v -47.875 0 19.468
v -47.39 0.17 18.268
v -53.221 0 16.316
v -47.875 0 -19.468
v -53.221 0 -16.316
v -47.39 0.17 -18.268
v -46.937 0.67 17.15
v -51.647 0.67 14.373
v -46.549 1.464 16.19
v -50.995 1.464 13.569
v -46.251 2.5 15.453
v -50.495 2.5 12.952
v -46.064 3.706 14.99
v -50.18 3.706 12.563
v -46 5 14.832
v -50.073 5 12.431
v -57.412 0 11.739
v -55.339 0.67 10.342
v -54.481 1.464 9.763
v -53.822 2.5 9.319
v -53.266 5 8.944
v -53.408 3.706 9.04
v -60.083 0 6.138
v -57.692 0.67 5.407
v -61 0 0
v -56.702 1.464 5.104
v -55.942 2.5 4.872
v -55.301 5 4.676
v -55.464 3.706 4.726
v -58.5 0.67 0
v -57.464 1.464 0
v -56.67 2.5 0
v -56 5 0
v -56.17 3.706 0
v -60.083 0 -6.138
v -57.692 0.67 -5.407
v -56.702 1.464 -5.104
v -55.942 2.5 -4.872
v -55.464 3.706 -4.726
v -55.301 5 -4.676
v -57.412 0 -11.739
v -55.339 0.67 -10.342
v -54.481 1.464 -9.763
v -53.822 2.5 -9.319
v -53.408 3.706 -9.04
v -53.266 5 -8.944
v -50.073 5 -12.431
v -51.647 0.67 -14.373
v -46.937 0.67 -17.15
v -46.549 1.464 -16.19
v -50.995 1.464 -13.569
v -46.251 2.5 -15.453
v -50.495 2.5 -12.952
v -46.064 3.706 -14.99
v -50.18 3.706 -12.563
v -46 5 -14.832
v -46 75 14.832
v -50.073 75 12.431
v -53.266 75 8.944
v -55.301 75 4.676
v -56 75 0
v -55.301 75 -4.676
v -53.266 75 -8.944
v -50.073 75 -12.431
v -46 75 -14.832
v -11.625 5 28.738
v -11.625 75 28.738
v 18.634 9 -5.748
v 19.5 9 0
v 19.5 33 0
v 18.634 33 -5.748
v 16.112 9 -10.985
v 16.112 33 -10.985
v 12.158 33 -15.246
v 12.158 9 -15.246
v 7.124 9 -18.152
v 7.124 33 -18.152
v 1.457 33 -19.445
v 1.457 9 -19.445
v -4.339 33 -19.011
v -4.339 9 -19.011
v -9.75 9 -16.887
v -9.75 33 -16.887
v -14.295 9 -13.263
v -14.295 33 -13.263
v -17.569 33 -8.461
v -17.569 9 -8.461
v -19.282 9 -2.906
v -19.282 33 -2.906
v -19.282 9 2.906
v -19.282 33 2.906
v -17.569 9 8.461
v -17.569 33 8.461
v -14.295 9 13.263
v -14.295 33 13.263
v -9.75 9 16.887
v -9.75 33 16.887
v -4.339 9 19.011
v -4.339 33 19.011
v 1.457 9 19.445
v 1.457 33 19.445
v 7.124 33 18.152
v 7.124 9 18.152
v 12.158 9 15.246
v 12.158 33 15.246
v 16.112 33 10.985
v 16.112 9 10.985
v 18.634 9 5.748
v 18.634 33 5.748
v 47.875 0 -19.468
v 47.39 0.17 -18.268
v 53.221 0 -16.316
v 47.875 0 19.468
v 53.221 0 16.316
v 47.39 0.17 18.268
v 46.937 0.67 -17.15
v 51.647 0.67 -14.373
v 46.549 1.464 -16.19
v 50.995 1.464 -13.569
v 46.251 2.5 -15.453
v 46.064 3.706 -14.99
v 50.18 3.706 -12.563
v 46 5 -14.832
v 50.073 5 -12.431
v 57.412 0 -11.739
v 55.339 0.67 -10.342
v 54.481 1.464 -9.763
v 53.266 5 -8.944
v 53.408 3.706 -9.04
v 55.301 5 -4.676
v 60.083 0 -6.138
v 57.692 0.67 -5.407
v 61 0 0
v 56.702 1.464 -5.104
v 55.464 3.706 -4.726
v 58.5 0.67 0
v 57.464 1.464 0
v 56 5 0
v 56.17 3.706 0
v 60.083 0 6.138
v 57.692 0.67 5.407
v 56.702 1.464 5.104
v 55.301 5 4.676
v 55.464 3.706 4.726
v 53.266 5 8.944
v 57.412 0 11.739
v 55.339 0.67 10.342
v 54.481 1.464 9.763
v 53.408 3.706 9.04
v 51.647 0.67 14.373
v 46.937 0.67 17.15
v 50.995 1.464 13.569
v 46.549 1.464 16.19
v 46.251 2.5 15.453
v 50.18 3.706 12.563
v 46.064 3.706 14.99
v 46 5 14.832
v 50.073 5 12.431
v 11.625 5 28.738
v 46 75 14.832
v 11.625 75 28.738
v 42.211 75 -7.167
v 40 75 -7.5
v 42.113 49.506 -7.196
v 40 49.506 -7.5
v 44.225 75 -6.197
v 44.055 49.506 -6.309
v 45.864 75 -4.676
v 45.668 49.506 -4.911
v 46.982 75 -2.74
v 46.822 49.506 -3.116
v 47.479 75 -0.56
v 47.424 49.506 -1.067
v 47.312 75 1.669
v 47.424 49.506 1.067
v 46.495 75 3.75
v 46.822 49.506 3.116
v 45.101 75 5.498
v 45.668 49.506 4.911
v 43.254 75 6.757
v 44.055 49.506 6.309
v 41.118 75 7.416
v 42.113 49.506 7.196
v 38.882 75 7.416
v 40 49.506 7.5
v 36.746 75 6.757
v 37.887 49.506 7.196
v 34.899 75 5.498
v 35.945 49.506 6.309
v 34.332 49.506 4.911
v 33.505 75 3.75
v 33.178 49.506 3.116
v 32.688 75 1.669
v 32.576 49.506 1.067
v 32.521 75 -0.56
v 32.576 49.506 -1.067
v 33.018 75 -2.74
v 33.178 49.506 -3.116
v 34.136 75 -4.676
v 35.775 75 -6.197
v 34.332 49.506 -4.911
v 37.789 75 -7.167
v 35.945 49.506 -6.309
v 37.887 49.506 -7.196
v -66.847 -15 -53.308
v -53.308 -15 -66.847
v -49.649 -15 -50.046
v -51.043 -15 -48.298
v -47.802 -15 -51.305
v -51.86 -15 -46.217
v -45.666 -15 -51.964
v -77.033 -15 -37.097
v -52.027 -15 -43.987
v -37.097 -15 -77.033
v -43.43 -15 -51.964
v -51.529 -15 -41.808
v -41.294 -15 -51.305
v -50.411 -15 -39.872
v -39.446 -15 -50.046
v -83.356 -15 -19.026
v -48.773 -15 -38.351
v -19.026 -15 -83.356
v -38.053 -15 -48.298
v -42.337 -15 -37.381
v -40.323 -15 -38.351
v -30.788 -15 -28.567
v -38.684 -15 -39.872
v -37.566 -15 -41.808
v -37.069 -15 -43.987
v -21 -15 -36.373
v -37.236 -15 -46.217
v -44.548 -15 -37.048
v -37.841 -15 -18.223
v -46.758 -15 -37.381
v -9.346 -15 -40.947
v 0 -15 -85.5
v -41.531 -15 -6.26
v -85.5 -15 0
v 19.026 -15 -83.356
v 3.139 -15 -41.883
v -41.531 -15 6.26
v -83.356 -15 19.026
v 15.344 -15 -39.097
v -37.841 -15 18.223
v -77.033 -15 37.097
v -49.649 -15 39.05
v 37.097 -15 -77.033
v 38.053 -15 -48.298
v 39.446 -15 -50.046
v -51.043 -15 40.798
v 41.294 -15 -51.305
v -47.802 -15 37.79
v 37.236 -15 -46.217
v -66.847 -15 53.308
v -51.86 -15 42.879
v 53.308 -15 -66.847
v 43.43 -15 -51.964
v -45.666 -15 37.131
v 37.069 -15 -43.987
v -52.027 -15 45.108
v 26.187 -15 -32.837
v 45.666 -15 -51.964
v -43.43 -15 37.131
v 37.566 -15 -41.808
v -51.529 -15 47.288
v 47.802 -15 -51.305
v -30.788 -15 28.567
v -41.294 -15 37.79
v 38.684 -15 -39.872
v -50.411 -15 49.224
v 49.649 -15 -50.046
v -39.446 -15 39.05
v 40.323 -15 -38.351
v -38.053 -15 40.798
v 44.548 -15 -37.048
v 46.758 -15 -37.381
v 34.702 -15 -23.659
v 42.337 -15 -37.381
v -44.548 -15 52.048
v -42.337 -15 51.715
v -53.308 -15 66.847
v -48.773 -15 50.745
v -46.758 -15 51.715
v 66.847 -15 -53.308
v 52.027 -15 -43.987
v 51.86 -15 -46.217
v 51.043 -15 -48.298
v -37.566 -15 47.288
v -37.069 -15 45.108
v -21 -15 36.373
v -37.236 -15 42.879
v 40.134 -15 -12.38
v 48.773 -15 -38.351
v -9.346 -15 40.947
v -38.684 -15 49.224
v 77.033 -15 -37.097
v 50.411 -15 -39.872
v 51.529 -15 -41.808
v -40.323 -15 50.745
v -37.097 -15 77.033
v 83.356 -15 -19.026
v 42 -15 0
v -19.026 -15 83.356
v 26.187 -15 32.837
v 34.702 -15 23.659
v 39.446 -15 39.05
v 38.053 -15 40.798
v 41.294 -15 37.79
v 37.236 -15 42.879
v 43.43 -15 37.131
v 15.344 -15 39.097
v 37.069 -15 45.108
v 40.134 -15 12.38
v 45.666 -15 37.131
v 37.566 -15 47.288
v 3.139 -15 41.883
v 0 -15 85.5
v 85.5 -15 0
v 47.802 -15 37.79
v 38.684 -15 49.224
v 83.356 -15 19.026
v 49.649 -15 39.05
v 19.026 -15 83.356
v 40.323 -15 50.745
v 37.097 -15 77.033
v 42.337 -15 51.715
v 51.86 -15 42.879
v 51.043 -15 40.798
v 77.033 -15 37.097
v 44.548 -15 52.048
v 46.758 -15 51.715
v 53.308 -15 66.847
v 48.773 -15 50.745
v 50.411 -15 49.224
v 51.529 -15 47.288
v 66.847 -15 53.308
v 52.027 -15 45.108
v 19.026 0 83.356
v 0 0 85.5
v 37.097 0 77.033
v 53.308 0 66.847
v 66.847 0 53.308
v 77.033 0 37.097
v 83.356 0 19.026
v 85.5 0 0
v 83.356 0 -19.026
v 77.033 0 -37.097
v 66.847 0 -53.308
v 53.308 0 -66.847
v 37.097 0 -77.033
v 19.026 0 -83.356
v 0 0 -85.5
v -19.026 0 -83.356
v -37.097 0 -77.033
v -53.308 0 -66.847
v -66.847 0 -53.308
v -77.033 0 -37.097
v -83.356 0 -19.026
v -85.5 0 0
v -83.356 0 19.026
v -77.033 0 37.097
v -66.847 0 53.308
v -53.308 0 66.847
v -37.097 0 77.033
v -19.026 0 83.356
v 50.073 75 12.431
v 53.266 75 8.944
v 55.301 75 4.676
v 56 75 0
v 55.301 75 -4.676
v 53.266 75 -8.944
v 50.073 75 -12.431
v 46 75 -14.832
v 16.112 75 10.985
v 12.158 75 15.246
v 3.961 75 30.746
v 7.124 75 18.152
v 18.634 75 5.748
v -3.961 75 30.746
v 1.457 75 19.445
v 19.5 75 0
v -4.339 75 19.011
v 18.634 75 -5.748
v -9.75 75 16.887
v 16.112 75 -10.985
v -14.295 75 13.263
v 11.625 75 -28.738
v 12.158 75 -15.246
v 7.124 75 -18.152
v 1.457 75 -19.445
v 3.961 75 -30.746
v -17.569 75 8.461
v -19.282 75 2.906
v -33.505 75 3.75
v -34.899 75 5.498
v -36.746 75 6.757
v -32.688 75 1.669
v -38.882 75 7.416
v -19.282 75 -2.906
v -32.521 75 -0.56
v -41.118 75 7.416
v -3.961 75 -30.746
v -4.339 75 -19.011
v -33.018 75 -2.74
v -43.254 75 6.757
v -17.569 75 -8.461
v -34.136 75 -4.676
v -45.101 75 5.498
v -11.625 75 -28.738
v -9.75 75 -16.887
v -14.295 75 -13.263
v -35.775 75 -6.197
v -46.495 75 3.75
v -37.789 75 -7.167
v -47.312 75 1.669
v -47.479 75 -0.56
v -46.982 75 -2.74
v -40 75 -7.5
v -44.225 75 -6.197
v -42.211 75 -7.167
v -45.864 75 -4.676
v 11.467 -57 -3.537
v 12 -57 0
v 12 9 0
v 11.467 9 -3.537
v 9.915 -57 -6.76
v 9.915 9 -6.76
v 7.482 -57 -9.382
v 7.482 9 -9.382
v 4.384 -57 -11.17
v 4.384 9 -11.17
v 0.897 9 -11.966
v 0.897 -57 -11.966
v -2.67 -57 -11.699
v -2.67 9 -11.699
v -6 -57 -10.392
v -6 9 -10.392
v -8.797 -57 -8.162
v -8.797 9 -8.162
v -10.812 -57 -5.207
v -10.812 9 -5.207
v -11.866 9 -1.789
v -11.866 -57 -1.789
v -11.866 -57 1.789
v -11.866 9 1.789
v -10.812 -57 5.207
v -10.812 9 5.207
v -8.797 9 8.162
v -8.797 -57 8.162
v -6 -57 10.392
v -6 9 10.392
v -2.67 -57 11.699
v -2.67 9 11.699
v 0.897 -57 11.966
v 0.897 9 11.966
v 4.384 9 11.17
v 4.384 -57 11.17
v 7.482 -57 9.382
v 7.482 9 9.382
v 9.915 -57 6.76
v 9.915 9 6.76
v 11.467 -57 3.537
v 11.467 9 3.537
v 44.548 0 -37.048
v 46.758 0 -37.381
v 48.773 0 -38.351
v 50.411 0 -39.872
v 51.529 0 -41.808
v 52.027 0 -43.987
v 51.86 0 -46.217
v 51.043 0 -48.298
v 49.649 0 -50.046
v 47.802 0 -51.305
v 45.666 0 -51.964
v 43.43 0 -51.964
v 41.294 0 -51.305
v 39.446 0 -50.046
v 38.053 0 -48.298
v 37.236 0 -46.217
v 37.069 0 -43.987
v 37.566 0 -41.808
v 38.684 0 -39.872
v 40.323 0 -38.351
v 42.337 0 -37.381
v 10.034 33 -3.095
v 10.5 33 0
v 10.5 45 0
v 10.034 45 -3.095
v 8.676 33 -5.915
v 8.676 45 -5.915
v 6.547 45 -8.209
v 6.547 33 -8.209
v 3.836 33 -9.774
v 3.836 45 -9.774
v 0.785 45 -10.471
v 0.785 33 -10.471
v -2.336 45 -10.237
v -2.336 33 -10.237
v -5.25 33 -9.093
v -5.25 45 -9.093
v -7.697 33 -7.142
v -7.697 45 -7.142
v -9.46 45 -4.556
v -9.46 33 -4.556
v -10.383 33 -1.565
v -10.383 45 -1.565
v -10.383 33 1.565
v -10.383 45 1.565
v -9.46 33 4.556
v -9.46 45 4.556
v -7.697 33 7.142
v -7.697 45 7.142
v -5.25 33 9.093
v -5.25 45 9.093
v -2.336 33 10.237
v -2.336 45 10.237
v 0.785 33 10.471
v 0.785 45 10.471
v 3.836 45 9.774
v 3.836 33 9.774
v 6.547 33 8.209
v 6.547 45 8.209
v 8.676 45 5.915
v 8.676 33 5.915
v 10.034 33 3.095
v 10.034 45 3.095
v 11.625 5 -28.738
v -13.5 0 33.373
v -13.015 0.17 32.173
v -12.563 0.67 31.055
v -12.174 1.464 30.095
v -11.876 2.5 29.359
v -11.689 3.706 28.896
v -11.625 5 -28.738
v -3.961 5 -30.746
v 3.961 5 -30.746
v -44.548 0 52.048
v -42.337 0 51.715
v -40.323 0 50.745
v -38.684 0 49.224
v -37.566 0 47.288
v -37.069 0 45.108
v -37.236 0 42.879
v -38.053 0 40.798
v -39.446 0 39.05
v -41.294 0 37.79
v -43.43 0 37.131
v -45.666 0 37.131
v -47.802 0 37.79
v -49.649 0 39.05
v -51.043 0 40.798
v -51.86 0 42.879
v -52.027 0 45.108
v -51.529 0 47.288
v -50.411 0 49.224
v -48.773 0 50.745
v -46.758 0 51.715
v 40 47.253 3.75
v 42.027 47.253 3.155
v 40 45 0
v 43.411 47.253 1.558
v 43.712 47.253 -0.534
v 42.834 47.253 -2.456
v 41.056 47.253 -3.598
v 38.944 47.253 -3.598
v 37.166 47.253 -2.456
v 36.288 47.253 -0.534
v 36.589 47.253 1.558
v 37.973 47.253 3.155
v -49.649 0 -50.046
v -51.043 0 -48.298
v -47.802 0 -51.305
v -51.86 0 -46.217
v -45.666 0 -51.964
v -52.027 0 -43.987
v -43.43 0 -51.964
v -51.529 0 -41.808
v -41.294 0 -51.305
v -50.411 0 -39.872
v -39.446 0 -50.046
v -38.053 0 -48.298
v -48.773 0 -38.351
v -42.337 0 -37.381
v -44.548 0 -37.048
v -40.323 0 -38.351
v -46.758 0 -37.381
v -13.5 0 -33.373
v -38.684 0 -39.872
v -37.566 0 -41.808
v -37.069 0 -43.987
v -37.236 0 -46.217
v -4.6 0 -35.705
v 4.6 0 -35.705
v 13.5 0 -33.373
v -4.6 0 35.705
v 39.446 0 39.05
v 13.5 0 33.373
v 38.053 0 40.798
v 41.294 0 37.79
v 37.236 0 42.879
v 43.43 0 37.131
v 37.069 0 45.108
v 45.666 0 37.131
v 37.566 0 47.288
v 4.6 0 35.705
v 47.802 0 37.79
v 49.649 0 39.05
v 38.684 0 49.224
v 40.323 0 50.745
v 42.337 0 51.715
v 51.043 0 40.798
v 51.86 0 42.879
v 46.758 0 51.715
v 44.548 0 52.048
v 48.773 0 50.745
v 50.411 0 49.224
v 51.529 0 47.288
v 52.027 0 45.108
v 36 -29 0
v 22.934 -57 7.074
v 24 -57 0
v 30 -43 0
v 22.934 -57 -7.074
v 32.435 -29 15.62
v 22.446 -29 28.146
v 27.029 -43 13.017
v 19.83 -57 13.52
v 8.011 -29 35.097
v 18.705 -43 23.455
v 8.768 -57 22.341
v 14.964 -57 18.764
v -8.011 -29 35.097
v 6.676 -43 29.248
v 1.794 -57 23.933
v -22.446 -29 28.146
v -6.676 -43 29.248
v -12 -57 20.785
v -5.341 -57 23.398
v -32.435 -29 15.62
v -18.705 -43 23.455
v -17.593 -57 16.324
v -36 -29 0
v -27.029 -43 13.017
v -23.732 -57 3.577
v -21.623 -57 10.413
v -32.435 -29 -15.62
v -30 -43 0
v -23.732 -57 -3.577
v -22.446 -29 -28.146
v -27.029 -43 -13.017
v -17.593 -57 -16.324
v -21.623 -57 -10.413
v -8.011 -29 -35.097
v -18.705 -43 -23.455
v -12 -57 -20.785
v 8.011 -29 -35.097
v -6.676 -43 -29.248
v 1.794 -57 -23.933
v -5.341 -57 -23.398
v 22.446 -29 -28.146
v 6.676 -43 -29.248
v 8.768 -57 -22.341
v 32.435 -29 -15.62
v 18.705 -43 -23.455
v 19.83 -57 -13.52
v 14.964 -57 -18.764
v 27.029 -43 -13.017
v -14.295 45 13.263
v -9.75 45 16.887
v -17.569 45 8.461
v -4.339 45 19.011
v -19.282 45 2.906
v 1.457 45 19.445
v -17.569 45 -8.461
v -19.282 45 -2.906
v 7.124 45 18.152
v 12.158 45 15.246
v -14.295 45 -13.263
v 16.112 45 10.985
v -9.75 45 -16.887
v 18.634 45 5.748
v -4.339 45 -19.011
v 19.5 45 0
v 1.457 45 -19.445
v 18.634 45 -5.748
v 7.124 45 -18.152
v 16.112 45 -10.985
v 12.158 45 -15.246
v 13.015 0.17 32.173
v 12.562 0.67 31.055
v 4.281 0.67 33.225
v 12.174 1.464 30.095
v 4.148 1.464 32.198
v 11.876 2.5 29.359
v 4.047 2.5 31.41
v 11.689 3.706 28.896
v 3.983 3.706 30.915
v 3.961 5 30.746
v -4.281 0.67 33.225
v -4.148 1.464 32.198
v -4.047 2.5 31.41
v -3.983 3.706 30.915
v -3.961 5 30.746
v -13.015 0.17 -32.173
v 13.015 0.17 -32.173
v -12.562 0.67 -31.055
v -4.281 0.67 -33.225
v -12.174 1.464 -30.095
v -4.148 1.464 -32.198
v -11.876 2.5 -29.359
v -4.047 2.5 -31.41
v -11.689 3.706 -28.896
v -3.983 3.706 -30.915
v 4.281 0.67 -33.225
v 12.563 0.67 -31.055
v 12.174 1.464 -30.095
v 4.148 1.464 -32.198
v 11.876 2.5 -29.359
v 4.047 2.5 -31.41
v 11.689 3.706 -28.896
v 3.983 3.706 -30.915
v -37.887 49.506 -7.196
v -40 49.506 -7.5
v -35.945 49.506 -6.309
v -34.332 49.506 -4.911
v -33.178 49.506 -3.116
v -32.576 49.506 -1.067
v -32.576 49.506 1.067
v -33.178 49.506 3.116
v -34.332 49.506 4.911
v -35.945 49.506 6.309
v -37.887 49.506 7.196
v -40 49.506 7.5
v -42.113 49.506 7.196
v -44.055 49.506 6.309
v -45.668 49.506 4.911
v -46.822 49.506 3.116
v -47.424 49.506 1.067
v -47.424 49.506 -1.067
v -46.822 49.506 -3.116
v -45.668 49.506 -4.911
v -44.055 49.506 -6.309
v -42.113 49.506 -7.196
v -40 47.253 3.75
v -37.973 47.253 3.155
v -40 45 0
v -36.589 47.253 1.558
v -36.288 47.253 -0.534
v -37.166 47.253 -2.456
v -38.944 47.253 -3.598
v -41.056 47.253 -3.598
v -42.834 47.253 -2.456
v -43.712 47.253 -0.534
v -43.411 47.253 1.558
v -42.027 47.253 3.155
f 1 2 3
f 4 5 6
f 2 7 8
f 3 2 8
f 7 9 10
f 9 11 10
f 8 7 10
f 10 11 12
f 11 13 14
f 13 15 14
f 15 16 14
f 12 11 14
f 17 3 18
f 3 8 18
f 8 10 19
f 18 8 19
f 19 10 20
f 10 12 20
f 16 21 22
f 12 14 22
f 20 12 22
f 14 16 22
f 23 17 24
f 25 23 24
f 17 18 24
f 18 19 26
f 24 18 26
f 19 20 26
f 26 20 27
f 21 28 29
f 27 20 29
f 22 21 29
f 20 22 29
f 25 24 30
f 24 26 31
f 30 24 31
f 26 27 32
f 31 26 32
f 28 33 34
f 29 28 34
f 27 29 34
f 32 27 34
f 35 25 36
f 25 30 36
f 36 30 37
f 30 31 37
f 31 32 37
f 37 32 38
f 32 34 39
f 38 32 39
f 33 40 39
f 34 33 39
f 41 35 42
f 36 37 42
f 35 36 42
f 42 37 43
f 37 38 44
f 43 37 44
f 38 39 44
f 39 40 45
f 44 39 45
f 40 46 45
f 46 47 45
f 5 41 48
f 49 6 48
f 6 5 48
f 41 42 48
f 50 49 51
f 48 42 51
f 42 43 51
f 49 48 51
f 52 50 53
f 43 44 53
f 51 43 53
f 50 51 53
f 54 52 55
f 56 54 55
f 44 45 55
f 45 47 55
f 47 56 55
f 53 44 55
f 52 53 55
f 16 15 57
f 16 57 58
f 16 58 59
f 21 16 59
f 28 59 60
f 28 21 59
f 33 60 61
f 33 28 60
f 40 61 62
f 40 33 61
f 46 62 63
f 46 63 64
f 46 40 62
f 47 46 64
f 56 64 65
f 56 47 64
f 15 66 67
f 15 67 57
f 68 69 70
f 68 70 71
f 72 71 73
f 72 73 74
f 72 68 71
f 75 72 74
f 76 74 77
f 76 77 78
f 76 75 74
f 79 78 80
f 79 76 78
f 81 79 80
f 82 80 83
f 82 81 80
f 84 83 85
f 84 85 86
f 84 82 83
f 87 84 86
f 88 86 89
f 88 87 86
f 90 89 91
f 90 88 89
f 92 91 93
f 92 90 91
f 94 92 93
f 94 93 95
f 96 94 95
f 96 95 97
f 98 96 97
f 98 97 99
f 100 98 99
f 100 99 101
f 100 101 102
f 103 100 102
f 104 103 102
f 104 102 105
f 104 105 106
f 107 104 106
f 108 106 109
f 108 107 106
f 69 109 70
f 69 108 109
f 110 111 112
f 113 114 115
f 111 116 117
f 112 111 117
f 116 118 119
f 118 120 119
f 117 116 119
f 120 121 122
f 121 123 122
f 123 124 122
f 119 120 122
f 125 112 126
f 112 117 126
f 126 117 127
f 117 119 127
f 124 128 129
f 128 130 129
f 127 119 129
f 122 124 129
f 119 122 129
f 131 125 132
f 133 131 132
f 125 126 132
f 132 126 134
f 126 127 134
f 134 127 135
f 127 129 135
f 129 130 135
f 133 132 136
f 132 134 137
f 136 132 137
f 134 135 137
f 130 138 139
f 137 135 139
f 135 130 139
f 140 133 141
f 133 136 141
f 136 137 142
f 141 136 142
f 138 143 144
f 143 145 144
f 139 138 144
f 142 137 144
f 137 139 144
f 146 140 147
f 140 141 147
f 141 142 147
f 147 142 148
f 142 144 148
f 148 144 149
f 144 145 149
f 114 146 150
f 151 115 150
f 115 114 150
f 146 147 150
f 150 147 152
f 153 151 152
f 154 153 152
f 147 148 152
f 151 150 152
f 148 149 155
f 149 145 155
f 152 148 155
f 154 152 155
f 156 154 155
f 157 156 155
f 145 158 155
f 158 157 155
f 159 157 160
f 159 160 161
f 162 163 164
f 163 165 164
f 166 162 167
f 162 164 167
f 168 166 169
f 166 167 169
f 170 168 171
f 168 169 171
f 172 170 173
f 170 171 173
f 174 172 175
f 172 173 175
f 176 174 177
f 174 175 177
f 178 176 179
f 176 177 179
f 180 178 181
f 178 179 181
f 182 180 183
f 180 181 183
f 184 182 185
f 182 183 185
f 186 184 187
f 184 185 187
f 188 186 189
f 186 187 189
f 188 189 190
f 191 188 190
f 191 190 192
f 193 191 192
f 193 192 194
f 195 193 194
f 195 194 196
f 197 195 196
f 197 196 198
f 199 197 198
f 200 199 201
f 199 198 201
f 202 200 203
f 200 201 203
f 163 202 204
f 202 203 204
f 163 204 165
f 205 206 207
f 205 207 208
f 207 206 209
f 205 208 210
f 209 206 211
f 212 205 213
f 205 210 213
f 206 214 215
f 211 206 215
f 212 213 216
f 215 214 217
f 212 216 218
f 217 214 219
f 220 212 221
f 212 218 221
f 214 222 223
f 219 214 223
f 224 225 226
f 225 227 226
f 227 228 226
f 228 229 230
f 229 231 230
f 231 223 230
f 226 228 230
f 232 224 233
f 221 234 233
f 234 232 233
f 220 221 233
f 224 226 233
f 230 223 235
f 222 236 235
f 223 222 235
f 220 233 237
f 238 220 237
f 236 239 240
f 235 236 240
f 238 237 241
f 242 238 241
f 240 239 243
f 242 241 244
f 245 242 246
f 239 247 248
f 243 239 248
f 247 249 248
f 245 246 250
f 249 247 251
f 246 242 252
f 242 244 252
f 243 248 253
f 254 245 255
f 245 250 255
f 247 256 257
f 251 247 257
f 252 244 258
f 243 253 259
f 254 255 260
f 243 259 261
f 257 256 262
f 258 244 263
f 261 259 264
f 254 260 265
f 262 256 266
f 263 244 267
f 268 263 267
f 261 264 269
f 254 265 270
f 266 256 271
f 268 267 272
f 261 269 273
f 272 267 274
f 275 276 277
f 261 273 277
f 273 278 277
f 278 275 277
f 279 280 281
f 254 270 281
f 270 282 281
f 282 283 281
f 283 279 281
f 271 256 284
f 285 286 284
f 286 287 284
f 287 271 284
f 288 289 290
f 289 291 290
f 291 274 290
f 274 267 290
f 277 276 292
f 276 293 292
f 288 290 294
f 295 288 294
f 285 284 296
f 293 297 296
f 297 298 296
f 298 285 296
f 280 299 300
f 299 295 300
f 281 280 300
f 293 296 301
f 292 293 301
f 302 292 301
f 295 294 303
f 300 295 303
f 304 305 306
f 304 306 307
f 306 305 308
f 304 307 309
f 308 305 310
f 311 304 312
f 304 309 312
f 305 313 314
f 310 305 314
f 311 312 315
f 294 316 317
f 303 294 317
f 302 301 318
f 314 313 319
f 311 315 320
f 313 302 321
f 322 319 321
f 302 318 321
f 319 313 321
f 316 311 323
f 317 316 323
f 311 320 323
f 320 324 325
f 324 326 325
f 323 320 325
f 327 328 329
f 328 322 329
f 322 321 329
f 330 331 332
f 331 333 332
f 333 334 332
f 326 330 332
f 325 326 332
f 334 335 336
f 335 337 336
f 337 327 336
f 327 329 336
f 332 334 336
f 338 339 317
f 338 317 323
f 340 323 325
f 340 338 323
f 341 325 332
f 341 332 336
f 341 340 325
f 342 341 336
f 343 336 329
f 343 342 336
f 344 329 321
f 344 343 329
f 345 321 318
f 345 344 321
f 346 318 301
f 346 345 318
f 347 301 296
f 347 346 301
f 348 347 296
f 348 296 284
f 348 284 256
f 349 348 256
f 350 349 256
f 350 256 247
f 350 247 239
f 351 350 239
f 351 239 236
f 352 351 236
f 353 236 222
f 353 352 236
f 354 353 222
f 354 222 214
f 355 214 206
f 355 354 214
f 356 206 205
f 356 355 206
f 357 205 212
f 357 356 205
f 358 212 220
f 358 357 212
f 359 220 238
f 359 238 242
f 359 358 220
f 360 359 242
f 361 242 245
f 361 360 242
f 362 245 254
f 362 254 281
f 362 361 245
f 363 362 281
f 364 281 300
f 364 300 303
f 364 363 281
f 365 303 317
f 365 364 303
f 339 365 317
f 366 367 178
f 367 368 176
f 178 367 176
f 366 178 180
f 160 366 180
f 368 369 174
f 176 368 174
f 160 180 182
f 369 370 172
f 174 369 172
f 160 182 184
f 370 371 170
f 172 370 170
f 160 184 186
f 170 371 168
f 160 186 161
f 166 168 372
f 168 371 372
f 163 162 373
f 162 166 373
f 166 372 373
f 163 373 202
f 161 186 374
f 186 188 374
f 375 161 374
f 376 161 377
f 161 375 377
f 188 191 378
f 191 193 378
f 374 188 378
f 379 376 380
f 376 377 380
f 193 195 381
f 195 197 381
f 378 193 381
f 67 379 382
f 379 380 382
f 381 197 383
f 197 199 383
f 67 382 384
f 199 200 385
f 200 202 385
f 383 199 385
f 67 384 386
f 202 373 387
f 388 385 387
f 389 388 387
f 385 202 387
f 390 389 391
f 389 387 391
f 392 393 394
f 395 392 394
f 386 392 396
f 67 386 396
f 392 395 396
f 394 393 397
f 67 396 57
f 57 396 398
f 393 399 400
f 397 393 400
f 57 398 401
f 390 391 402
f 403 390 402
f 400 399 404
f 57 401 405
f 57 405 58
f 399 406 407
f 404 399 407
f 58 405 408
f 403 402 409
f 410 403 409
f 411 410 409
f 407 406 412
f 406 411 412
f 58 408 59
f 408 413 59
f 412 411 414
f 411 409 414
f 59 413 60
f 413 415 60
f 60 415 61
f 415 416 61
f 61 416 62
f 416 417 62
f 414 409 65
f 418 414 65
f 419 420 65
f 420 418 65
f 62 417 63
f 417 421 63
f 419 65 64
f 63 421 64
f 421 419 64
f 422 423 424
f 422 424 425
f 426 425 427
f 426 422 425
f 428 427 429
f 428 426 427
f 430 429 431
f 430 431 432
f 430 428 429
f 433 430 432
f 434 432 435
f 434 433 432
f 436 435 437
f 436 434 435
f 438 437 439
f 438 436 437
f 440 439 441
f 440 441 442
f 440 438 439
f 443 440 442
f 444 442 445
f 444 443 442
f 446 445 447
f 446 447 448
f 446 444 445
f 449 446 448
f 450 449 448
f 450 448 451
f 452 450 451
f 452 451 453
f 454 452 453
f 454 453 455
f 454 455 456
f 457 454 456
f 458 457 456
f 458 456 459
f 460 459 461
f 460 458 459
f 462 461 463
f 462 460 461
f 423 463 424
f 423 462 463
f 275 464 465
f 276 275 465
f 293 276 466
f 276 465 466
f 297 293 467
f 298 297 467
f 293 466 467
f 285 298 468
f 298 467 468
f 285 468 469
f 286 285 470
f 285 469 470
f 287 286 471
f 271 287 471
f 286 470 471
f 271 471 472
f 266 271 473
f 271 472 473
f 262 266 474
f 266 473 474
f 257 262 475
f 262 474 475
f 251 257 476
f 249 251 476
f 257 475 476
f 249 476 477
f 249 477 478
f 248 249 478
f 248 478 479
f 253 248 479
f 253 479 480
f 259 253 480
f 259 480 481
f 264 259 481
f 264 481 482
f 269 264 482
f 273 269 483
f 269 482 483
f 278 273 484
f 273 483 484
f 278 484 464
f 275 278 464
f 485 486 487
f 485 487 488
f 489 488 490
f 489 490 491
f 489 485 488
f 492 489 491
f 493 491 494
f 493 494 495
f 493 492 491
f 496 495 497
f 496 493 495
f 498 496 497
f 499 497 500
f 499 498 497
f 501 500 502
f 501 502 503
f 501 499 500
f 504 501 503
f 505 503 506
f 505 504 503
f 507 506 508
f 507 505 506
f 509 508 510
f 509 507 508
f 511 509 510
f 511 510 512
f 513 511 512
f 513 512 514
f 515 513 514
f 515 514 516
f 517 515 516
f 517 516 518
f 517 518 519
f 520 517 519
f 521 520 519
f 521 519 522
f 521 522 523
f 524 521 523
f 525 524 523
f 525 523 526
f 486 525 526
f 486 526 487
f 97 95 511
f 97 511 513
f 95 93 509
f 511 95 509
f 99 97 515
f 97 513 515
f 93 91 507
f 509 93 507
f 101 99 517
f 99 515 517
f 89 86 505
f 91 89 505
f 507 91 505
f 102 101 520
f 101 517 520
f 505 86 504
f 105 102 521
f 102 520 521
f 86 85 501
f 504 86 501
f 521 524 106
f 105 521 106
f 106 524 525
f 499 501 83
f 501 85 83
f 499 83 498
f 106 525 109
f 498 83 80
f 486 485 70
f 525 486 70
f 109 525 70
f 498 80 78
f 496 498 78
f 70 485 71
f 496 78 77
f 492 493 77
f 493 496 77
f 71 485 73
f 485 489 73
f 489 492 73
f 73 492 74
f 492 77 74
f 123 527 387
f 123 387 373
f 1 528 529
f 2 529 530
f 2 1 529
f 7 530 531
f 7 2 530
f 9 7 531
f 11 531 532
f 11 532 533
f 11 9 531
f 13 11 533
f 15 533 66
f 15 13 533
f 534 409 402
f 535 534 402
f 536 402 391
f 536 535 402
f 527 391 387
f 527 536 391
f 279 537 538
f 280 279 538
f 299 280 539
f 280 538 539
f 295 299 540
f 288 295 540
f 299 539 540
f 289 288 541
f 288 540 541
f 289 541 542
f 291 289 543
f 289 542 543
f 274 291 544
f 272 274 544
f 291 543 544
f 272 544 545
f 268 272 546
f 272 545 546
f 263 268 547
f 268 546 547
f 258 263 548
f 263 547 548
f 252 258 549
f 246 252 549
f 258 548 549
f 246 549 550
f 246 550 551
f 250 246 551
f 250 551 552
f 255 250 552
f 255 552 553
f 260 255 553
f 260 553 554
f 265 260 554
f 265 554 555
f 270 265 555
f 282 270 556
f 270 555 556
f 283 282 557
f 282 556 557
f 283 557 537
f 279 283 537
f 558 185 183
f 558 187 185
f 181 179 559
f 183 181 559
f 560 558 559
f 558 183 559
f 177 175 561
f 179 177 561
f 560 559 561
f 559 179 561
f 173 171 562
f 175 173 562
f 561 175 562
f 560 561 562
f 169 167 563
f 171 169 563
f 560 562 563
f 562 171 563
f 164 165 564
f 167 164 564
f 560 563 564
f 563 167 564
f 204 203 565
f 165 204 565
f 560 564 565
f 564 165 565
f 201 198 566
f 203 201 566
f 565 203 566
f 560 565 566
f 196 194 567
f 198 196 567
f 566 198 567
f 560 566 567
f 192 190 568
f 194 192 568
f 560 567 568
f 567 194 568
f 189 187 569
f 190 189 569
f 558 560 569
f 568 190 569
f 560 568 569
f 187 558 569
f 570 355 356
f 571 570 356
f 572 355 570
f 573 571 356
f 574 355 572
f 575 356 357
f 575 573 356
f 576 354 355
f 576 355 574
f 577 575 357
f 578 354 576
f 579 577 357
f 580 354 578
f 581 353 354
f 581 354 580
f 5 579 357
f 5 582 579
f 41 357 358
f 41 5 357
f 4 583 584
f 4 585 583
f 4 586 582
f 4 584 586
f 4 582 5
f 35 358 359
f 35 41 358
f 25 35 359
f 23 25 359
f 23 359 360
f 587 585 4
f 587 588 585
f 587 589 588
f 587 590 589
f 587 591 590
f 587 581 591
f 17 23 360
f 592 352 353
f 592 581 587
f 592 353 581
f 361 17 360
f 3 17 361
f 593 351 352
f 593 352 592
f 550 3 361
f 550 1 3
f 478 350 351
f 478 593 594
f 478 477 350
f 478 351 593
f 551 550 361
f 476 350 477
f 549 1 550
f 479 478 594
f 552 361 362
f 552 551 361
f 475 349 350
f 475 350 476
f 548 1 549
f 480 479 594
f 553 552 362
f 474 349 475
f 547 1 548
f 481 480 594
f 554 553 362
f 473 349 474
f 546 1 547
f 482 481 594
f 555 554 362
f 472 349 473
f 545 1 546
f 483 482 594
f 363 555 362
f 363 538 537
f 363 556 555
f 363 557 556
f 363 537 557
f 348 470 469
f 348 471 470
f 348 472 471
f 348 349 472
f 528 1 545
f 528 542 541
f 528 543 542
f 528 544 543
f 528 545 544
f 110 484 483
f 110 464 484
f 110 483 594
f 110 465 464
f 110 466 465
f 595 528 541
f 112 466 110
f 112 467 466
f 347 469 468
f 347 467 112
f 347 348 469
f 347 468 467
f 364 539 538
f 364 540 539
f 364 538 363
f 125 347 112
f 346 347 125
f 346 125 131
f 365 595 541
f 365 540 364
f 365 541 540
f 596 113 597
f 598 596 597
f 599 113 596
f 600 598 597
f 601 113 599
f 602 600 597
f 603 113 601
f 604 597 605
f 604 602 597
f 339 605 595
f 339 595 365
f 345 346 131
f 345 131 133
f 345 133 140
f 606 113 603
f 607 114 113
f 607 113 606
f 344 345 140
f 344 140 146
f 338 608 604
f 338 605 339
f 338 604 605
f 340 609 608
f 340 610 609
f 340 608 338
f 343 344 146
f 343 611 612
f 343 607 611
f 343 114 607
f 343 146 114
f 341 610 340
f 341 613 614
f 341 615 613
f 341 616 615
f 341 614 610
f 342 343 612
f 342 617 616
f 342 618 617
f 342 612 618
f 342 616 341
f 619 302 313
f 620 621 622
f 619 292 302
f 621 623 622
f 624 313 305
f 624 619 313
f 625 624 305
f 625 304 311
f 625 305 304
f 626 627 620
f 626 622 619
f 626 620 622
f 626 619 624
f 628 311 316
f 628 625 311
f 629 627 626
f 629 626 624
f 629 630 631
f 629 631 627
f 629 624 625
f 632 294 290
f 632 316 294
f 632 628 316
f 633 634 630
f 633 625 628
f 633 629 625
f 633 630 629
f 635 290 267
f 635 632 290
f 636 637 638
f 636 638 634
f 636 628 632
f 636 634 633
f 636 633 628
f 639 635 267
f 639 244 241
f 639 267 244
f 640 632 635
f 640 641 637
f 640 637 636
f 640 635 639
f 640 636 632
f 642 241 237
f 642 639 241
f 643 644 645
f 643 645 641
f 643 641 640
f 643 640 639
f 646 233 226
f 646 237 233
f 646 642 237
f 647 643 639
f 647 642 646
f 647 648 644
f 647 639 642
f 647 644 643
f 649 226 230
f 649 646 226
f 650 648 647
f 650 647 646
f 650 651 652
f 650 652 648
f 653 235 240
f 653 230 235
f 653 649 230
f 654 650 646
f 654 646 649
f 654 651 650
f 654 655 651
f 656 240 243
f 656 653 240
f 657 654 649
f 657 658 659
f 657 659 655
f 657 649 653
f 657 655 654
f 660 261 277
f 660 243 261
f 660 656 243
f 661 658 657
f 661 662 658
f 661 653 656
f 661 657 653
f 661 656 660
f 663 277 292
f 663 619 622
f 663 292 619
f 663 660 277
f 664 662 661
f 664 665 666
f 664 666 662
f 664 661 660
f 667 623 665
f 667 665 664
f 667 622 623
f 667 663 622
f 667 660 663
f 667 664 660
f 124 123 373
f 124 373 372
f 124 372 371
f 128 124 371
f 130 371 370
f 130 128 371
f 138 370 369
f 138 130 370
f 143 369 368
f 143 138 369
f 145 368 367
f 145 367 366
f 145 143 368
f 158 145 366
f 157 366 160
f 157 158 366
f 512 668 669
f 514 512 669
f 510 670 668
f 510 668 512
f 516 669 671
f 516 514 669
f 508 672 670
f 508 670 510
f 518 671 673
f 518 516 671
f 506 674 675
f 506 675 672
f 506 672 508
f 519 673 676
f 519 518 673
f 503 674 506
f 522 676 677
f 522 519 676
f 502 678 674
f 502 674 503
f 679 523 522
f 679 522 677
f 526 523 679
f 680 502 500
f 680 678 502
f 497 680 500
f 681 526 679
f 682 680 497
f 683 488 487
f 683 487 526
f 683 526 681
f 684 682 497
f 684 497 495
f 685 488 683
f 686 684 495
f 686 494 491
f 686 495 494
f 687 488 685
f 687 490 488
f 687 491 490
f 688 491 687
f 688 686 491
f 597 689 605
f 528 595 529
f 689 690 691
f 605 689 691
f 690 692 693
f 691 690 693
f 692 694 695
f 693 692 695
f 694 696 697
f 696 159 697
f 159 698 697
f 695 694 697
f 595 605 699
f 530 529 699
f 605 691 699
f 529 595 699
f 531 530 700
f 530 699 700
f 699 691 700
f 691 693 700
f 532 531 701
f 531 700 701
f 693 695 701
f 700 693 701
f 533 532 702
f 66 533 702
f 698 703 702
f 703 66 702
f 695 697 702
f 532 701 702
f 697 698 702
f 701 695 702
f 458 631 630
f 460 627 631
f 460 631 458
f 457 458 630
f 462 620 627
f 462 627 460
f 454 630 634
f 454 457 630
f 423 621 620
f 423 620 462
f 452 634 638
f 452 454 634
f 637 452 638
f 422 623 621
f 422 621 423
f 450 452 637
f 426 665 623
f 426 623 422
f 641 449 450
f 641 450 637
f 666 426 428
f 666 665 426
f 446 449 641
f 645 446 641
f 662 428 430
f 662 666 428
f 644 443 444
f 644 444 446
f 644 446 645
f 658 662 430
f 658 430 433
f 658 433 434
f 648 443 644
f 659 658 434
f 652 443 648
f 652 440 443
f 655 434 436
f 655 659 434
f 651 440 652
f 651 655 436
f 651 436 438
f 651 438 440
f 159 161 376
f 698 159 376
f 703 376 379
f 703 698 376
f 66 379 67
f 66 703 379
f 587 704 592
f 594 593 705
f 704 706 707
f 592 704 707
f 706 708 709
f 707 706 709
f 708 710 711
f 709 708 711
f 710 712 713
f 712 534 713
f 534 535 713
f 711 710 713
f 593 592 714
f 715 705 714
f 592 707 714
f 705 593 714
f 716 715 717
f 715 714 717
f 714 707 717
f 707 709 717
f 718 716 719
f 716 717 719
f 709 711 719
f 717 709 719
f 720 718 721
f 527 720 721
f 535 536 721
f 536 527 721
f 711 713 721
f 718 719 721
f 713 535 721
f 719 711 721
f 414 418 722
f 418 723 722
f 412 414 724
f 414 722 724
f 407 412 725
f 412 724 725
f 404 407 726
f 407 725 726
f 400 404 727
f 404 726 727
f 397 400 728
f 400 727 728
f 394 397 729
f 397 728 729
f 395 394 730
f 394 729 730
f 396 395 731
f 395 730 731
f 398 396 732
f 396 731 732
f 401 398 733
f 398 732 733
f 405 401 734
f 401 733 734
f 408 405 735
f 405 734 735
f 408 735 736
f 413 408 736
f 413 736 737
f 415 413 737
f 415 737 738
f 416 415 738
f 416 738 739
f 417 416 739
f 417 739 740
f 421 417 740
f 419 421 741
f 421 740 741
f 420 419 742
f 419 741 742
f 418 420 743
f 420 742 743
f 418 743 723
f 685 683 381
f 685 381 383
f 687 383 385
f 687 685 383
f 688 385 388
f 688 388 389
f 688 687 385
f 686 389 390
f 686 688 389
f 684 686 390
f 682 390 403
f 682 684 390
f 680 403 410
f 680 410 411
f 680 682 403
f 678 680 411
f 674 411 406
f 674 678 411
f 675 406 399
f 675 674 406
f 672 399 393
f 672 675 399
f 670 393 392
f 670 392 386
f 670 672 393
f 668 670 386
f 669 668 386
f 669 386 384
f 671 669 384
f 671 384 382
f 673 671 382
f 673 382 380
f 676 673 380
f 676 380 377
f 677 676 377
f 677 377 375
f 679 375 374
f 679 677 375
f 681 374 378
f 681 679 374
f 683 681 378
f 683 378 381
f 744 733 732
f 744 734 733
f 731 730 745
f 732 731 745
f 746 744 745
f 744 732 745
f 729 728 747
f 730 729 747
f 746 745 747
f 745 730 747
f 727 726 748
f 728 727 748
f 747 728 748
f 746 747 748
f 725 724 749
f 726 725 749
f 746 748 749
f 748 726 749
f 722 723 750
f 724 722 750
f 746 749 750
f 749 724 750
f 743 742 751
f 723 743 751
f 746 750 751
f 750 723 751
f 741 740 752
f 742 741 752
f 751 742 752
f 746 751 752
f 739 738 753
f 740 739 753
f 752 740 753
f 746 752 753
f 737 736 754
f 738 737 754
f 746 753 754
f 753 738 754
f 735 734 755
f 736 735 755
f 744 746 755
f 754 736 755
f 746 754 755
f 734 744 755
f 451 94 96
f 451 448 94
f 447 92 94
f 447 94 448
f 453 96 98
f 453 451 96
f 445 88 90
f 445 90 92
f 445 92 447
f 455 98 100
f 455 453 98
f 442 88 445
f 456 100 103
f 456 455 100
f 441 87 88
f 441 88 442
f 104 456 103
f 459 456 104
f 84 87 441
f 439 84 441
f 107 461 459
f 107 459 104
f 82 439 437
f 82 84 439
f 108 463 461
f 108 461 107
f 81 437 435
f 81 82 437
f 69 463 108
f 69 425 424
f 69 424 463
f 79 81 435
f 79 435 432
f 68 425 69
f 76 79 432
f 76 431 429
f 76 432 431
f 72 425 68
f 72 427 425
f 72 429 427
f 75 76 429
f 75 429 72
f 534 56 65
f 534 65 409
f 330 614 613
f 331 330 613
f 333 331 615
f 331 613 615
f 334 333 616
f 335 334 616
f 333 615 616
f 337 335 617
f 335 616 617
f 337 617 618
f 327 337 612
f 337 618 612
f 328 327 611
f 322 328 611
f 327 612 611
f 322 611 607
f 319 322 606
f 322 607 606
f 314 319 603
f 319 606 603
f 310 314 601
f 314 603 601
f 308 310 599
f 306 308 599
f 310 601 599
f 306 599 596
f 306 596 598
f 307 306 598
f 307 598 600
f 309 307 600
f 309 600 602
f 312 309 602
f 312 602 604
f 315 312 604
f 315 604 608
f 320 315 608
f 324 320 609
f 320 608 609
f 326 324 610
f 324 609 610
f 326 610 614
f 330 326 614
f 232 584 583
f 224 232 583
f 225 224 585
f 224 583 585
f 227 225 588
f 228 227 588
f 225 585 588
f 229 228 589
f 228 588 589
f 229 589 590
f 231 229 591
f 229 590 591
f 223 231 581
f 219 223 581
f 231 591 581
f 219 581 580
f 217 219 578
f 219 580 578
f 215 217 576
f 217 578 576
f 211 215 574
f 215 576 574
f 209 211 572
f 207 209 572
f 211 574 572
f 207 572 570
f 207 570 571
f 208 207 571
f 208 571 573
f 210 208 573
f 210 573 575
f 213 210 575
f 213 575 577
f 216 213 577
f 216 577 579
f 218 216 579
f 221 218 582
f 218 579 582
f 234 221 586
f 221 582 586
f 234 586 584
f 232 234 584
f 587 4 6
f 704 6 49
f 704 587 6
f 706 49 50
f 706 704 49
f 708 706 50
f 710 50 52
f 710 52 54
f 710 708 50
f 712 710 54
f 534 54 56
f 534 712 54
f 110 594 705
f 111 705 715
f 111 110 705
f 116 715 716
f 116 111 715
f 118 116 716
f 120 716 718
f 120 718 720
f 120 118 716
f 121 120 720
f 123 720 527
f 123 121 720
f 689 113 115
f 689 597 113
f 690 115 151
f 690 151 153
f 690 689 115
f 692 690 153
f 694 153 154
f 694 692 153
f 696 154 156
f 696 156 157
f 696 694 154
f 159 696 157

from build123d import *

# Parameters (mm, degrees)
SKETCH1_R                   = 7.5
SKETCH1_R_2                 = 19.5
SKETCH1_R_3                 = 10.5
BOSS_EXTRUDE1_DEPTH         = 75
SKETCH1_3_R                 = 85.5
SKETCH1_3_R_2               = 7.5
BOSS_EXTRUDE2_DEPTH         = 15
F_1_0MM_DOWEL_HOLE1_D       = 15
F_1_0MM_DOWEL_HOLE1_DEPTH   = 25.493545357
F_1_0MM_DOWEL_HOLE1_TIP     = 4.506454643
SKETCH4_R                   = 42
SKETCH5_R                   = 24
ADVANCEDHOLE1_START         = -57
ADVANCEDHOLE1_OUTLINE_R     = 10.5
ADVANCEDHOLE1_DEPTH         = 132
ADVANCEDHOLE1_START_2       = 45
ADVANCEDHOLE1_2_OUTLINE_R   = 19.5
ADVANCEDHOLE1_2_OUTLINE_R_2 = 10.5
ADVANCEDHOLE1_2_DEPTH       = 30
ADVANCEDHOLE1_START_3       = 9
ADVANCEDHOLE1_3_OUTLINE_R   = 19.5
ADVANCEDHOLE1_3_OUTLINE_R_2 = 10.5
ADVANCEDHOLE1_3_DEPTH       = 24
ADVANCEDHOLE1_4_OUTLINE_R   = 12
ADVANCEDHOLE1_4_OUTLINE_R_2 = 10.5
ADVANCEDHOLE1_4_DEPTH       = 66
FILLET1_R                   = 5


# Read off the part's stored shape, not the designer's step: AdvancedHole1
with BuildPart() as part:
    # Sketch1 → Boss-Extrude1 (new body)
    # profile 1 of 5: a face of its own
    with BuildSketch(Plane(origin=(0, 0, 0), x_dir=(1, 0, 0), z_dir=(0, 1, 0))):
        with BuildLine():
            Line((11.625, 28.737769137), (46, 14.832396974))
            ThreePointArc((46, 14.832396974), (56, 0), (46, -14.832396974))
            Line((46, -14.832396974), (11.625, -28.737769137))
            ThreePointArc((11.625, -28.737769137), (0, -31), (-11.625, -28.737769137))
            Line((-11.625, -28.737769137), (-46, -14.832396974))
            ThreePointArc((-46, -14.832396974), (-56, 0), (-46, 14.832396974))
            Line((-46, 14.832396974), (-11.625, 28.737769137))
            ThreePointArc((-11.625, 28.737769137), (0, 31), (11.625, 28.737769137))
        make_face()
        with Locations((-40, 0)):
            Circle(SKETCH1_R, mode=Mode.SUBTRACT)
        with Locations((40, 0)):
            Circle(SKETCH1_R, mode=Mode.SUBTRACT)
        Circle(SKETCH1_R_2, mode=Mode.SUBTRACT)
    # profile 2 of 5: a face of its own
    with BuildSketch(Plane(origin=(0, 0, 0), x_dir=(1, 0, 0), z_dir=(0, 1, 0))):
        Circle(SKETCH1_R_2)
        Circle(SKETCH1_R_3, mode=Mode.SUBTRACT)
    # profile 3 of 5: a face of its own
    with BuildSketch(Plane(origin=(0, 0, 0), x_dir=(1, 0, 0), z_dir=(0, 1, 0))):
        Circle(SKETCH1_R_3)
    # profile 4 of 5: a face of its own
    with BuildSketch(Plane(origin=(0, 0, 0), x_dir=(1, 0, 0), z_dir=(0, 1, 0))):
        with Locations((40, 0)):
            Circle(SKETCH1_R)
    # profile 5 of 5: a face of its own
    with BuildSketch(Plane(origin=(0, 0, 0), x_dir=(1, 0, 0), z_dir=(0, 1, 0))):
        with Locations((-40, 0)):
            Circle(SKETCH1_R)
    extrude(amount=BOSS_EXTRUDE1_DEPTH)

    # Sketch1<3> → Boss-Extrude2 (add)
    with BuildSketch(Plane(origin=(0, 0, 0), x_dir=(1, 0, 0), z_dir=(0, 1, 0))):
        with Locations(Location((0, 0, 0), (0, 0, 270))):
            Circle(SKETCH1_3_R)
        with Locations(Location((44.547727215, 44.547727215, 0), (0, 0, 270))):
            Circle(SKETCH1_3_R_2, mode=Mode.SUBTRACT)
        with Locations(Location((44.547727215, -44.547727215, 0), (0, 0, 270))):
            Circle(SKETCH1_3_R_2, mode=Mode.SUBTRACT)
        with Locations(Location((-44.547727215, -44.547727215, 0), (0, 0, 270))):
            Circle(SKETCH1_3_R_2, mode=Mode.SUBTRACT)
        with Locations(Location((-44.547727215, 44.547727215, 0), (0, 0, 270))):
            Circle(SKETCH1_3_R_2, mode=Mode.SUBTRACT)
    extrude(amount=-BOSS_EXTRUDE2_DEPTH)

    # Ø1.0mm Dowel Hole1
    with Locations(Plane(origin=(-40, 75, 0), x_dir=(0, 0, 1), z_dir=(0, 1, 0))):
        with Locations((0, 0), (0, 80)):
            Hole(F_1_0MM_DOWEL_HOLE1_D / 2, depth=F_1_0MM_DOWEL_HOLE1_DEPTH)
            with Locations((0, 0, -(F_1_0MM_DOWEL_HOLE1_DEPTH + F_1_0MM_DOWEL_HOLE1_TIP / 2))):  # 118° drill point
                Cone(0, F_1_0MM_DOWEL_HOLE1_D / 2, F_1_0MM_DOWEL_HOLE1_TIP, mode=Mode.SUBTRACT)

    # Sketch4 → Loft1 section 0
    with BuildSketch(Plane.XZ.offset(15)):
        Circle(SKETCH4_R)
    # Sketch5 → Loft1 section 1
    with BuildSketch(Plane(origin=(0, -57, 0), x_dir=(-1, 0, 0), z_dir=(0, -1, 0))):
        Circle(SKETCH5_R)
    loft()

    # AdvancedHole1 outline → AdvancedHole1 (cut)
    with BuildSketch(Plane(origin=(0, 0, 0), x_dir=(1, 0, 0), z_dir=(0, 1, 0)).offset(ADVANCEDHOLE1_START)):
        Circle(ADVANCEDHOLE1_OUTLINE_R)
    extrude(amount=ADVANCEDHOLE1_DEPTH, mode=Mode.SUBTRACT)

    # AdvancedHole1 2 outline → AdvancedHole1 2 (cut)
    with BuildSketch(Plane(origin=(0, 0, 0), x_dir=(1, 0, 0), z_dir=(0, 1, 0)).offset(ADVANCEDHOLE1_START_2)):
        Circle(ADVANCEDHOLE1_2_OUTLINE_R)
        Circle(ADVANCEDHOLE1_2_OUTLINE_R_2, mode=Mode.SUBTRACT)
    extrude(amount=ADVANCEDHOLE1_2_DEPTH, mode=Mode.SUBTRACT)

    # AdvancedHole1 3 outline → AdvancedHole1 3 (cut)
    with BuildSketch(Plane(origin=(0, 0, 0), x_dir=(1, 0, 0), z_dir=(0, 1, 0)).offset(ADVANCEDHOLE1_START_3)):
        Circle(ADVANCEDHOLE1_3_OUTLINE_R)
        Circle(ADVANCEDHOLE1_3_OUTLINE_R_2, mode=Mode.SUBTRACT)
    extrude(amount=ADVANCEDHOLE1_3_DEPTH, mode=Mode.SUBTRACT)

    # AdvancedHole1 4 outline → AdvancedHole1 4 (cut)
    with BuildSketch(Plane(origin=(0, 0, 0), x_dir=(1, 0, 0), z_dir=(0, 1, 0)).offset(ADVANCEDHOLE1_START)):
        Circle(ADVANCEDHOLE1_4_OUTLINE_R)
        Circle(ADVANCEDHOLE1_4_OUTLINE_R_2, mode=Mode.SUBTRACT)
    extrude(amount=ADVANCEDHOLE1_4_DEPTH, mode=Mode.SUBTRACT)

    # Fillet1
    fillet1_edges = [part.edges().sort_by_distance(p)[0] for p in [
        (28.8125, 0, 21.785083056),
        (0, 0, 31),
        (-28.8125, 0, 21.785083056),
        (-56, 0, 0),
        (-28.8125, 0, -21.785083056),
        (0, 0, -31),
        (28.8125, 0, -21.785083056),
        (56, 0, 0),
    ]]
    fillet(fillet1_edges, radius=FILLET1_R)


solid = part.part
